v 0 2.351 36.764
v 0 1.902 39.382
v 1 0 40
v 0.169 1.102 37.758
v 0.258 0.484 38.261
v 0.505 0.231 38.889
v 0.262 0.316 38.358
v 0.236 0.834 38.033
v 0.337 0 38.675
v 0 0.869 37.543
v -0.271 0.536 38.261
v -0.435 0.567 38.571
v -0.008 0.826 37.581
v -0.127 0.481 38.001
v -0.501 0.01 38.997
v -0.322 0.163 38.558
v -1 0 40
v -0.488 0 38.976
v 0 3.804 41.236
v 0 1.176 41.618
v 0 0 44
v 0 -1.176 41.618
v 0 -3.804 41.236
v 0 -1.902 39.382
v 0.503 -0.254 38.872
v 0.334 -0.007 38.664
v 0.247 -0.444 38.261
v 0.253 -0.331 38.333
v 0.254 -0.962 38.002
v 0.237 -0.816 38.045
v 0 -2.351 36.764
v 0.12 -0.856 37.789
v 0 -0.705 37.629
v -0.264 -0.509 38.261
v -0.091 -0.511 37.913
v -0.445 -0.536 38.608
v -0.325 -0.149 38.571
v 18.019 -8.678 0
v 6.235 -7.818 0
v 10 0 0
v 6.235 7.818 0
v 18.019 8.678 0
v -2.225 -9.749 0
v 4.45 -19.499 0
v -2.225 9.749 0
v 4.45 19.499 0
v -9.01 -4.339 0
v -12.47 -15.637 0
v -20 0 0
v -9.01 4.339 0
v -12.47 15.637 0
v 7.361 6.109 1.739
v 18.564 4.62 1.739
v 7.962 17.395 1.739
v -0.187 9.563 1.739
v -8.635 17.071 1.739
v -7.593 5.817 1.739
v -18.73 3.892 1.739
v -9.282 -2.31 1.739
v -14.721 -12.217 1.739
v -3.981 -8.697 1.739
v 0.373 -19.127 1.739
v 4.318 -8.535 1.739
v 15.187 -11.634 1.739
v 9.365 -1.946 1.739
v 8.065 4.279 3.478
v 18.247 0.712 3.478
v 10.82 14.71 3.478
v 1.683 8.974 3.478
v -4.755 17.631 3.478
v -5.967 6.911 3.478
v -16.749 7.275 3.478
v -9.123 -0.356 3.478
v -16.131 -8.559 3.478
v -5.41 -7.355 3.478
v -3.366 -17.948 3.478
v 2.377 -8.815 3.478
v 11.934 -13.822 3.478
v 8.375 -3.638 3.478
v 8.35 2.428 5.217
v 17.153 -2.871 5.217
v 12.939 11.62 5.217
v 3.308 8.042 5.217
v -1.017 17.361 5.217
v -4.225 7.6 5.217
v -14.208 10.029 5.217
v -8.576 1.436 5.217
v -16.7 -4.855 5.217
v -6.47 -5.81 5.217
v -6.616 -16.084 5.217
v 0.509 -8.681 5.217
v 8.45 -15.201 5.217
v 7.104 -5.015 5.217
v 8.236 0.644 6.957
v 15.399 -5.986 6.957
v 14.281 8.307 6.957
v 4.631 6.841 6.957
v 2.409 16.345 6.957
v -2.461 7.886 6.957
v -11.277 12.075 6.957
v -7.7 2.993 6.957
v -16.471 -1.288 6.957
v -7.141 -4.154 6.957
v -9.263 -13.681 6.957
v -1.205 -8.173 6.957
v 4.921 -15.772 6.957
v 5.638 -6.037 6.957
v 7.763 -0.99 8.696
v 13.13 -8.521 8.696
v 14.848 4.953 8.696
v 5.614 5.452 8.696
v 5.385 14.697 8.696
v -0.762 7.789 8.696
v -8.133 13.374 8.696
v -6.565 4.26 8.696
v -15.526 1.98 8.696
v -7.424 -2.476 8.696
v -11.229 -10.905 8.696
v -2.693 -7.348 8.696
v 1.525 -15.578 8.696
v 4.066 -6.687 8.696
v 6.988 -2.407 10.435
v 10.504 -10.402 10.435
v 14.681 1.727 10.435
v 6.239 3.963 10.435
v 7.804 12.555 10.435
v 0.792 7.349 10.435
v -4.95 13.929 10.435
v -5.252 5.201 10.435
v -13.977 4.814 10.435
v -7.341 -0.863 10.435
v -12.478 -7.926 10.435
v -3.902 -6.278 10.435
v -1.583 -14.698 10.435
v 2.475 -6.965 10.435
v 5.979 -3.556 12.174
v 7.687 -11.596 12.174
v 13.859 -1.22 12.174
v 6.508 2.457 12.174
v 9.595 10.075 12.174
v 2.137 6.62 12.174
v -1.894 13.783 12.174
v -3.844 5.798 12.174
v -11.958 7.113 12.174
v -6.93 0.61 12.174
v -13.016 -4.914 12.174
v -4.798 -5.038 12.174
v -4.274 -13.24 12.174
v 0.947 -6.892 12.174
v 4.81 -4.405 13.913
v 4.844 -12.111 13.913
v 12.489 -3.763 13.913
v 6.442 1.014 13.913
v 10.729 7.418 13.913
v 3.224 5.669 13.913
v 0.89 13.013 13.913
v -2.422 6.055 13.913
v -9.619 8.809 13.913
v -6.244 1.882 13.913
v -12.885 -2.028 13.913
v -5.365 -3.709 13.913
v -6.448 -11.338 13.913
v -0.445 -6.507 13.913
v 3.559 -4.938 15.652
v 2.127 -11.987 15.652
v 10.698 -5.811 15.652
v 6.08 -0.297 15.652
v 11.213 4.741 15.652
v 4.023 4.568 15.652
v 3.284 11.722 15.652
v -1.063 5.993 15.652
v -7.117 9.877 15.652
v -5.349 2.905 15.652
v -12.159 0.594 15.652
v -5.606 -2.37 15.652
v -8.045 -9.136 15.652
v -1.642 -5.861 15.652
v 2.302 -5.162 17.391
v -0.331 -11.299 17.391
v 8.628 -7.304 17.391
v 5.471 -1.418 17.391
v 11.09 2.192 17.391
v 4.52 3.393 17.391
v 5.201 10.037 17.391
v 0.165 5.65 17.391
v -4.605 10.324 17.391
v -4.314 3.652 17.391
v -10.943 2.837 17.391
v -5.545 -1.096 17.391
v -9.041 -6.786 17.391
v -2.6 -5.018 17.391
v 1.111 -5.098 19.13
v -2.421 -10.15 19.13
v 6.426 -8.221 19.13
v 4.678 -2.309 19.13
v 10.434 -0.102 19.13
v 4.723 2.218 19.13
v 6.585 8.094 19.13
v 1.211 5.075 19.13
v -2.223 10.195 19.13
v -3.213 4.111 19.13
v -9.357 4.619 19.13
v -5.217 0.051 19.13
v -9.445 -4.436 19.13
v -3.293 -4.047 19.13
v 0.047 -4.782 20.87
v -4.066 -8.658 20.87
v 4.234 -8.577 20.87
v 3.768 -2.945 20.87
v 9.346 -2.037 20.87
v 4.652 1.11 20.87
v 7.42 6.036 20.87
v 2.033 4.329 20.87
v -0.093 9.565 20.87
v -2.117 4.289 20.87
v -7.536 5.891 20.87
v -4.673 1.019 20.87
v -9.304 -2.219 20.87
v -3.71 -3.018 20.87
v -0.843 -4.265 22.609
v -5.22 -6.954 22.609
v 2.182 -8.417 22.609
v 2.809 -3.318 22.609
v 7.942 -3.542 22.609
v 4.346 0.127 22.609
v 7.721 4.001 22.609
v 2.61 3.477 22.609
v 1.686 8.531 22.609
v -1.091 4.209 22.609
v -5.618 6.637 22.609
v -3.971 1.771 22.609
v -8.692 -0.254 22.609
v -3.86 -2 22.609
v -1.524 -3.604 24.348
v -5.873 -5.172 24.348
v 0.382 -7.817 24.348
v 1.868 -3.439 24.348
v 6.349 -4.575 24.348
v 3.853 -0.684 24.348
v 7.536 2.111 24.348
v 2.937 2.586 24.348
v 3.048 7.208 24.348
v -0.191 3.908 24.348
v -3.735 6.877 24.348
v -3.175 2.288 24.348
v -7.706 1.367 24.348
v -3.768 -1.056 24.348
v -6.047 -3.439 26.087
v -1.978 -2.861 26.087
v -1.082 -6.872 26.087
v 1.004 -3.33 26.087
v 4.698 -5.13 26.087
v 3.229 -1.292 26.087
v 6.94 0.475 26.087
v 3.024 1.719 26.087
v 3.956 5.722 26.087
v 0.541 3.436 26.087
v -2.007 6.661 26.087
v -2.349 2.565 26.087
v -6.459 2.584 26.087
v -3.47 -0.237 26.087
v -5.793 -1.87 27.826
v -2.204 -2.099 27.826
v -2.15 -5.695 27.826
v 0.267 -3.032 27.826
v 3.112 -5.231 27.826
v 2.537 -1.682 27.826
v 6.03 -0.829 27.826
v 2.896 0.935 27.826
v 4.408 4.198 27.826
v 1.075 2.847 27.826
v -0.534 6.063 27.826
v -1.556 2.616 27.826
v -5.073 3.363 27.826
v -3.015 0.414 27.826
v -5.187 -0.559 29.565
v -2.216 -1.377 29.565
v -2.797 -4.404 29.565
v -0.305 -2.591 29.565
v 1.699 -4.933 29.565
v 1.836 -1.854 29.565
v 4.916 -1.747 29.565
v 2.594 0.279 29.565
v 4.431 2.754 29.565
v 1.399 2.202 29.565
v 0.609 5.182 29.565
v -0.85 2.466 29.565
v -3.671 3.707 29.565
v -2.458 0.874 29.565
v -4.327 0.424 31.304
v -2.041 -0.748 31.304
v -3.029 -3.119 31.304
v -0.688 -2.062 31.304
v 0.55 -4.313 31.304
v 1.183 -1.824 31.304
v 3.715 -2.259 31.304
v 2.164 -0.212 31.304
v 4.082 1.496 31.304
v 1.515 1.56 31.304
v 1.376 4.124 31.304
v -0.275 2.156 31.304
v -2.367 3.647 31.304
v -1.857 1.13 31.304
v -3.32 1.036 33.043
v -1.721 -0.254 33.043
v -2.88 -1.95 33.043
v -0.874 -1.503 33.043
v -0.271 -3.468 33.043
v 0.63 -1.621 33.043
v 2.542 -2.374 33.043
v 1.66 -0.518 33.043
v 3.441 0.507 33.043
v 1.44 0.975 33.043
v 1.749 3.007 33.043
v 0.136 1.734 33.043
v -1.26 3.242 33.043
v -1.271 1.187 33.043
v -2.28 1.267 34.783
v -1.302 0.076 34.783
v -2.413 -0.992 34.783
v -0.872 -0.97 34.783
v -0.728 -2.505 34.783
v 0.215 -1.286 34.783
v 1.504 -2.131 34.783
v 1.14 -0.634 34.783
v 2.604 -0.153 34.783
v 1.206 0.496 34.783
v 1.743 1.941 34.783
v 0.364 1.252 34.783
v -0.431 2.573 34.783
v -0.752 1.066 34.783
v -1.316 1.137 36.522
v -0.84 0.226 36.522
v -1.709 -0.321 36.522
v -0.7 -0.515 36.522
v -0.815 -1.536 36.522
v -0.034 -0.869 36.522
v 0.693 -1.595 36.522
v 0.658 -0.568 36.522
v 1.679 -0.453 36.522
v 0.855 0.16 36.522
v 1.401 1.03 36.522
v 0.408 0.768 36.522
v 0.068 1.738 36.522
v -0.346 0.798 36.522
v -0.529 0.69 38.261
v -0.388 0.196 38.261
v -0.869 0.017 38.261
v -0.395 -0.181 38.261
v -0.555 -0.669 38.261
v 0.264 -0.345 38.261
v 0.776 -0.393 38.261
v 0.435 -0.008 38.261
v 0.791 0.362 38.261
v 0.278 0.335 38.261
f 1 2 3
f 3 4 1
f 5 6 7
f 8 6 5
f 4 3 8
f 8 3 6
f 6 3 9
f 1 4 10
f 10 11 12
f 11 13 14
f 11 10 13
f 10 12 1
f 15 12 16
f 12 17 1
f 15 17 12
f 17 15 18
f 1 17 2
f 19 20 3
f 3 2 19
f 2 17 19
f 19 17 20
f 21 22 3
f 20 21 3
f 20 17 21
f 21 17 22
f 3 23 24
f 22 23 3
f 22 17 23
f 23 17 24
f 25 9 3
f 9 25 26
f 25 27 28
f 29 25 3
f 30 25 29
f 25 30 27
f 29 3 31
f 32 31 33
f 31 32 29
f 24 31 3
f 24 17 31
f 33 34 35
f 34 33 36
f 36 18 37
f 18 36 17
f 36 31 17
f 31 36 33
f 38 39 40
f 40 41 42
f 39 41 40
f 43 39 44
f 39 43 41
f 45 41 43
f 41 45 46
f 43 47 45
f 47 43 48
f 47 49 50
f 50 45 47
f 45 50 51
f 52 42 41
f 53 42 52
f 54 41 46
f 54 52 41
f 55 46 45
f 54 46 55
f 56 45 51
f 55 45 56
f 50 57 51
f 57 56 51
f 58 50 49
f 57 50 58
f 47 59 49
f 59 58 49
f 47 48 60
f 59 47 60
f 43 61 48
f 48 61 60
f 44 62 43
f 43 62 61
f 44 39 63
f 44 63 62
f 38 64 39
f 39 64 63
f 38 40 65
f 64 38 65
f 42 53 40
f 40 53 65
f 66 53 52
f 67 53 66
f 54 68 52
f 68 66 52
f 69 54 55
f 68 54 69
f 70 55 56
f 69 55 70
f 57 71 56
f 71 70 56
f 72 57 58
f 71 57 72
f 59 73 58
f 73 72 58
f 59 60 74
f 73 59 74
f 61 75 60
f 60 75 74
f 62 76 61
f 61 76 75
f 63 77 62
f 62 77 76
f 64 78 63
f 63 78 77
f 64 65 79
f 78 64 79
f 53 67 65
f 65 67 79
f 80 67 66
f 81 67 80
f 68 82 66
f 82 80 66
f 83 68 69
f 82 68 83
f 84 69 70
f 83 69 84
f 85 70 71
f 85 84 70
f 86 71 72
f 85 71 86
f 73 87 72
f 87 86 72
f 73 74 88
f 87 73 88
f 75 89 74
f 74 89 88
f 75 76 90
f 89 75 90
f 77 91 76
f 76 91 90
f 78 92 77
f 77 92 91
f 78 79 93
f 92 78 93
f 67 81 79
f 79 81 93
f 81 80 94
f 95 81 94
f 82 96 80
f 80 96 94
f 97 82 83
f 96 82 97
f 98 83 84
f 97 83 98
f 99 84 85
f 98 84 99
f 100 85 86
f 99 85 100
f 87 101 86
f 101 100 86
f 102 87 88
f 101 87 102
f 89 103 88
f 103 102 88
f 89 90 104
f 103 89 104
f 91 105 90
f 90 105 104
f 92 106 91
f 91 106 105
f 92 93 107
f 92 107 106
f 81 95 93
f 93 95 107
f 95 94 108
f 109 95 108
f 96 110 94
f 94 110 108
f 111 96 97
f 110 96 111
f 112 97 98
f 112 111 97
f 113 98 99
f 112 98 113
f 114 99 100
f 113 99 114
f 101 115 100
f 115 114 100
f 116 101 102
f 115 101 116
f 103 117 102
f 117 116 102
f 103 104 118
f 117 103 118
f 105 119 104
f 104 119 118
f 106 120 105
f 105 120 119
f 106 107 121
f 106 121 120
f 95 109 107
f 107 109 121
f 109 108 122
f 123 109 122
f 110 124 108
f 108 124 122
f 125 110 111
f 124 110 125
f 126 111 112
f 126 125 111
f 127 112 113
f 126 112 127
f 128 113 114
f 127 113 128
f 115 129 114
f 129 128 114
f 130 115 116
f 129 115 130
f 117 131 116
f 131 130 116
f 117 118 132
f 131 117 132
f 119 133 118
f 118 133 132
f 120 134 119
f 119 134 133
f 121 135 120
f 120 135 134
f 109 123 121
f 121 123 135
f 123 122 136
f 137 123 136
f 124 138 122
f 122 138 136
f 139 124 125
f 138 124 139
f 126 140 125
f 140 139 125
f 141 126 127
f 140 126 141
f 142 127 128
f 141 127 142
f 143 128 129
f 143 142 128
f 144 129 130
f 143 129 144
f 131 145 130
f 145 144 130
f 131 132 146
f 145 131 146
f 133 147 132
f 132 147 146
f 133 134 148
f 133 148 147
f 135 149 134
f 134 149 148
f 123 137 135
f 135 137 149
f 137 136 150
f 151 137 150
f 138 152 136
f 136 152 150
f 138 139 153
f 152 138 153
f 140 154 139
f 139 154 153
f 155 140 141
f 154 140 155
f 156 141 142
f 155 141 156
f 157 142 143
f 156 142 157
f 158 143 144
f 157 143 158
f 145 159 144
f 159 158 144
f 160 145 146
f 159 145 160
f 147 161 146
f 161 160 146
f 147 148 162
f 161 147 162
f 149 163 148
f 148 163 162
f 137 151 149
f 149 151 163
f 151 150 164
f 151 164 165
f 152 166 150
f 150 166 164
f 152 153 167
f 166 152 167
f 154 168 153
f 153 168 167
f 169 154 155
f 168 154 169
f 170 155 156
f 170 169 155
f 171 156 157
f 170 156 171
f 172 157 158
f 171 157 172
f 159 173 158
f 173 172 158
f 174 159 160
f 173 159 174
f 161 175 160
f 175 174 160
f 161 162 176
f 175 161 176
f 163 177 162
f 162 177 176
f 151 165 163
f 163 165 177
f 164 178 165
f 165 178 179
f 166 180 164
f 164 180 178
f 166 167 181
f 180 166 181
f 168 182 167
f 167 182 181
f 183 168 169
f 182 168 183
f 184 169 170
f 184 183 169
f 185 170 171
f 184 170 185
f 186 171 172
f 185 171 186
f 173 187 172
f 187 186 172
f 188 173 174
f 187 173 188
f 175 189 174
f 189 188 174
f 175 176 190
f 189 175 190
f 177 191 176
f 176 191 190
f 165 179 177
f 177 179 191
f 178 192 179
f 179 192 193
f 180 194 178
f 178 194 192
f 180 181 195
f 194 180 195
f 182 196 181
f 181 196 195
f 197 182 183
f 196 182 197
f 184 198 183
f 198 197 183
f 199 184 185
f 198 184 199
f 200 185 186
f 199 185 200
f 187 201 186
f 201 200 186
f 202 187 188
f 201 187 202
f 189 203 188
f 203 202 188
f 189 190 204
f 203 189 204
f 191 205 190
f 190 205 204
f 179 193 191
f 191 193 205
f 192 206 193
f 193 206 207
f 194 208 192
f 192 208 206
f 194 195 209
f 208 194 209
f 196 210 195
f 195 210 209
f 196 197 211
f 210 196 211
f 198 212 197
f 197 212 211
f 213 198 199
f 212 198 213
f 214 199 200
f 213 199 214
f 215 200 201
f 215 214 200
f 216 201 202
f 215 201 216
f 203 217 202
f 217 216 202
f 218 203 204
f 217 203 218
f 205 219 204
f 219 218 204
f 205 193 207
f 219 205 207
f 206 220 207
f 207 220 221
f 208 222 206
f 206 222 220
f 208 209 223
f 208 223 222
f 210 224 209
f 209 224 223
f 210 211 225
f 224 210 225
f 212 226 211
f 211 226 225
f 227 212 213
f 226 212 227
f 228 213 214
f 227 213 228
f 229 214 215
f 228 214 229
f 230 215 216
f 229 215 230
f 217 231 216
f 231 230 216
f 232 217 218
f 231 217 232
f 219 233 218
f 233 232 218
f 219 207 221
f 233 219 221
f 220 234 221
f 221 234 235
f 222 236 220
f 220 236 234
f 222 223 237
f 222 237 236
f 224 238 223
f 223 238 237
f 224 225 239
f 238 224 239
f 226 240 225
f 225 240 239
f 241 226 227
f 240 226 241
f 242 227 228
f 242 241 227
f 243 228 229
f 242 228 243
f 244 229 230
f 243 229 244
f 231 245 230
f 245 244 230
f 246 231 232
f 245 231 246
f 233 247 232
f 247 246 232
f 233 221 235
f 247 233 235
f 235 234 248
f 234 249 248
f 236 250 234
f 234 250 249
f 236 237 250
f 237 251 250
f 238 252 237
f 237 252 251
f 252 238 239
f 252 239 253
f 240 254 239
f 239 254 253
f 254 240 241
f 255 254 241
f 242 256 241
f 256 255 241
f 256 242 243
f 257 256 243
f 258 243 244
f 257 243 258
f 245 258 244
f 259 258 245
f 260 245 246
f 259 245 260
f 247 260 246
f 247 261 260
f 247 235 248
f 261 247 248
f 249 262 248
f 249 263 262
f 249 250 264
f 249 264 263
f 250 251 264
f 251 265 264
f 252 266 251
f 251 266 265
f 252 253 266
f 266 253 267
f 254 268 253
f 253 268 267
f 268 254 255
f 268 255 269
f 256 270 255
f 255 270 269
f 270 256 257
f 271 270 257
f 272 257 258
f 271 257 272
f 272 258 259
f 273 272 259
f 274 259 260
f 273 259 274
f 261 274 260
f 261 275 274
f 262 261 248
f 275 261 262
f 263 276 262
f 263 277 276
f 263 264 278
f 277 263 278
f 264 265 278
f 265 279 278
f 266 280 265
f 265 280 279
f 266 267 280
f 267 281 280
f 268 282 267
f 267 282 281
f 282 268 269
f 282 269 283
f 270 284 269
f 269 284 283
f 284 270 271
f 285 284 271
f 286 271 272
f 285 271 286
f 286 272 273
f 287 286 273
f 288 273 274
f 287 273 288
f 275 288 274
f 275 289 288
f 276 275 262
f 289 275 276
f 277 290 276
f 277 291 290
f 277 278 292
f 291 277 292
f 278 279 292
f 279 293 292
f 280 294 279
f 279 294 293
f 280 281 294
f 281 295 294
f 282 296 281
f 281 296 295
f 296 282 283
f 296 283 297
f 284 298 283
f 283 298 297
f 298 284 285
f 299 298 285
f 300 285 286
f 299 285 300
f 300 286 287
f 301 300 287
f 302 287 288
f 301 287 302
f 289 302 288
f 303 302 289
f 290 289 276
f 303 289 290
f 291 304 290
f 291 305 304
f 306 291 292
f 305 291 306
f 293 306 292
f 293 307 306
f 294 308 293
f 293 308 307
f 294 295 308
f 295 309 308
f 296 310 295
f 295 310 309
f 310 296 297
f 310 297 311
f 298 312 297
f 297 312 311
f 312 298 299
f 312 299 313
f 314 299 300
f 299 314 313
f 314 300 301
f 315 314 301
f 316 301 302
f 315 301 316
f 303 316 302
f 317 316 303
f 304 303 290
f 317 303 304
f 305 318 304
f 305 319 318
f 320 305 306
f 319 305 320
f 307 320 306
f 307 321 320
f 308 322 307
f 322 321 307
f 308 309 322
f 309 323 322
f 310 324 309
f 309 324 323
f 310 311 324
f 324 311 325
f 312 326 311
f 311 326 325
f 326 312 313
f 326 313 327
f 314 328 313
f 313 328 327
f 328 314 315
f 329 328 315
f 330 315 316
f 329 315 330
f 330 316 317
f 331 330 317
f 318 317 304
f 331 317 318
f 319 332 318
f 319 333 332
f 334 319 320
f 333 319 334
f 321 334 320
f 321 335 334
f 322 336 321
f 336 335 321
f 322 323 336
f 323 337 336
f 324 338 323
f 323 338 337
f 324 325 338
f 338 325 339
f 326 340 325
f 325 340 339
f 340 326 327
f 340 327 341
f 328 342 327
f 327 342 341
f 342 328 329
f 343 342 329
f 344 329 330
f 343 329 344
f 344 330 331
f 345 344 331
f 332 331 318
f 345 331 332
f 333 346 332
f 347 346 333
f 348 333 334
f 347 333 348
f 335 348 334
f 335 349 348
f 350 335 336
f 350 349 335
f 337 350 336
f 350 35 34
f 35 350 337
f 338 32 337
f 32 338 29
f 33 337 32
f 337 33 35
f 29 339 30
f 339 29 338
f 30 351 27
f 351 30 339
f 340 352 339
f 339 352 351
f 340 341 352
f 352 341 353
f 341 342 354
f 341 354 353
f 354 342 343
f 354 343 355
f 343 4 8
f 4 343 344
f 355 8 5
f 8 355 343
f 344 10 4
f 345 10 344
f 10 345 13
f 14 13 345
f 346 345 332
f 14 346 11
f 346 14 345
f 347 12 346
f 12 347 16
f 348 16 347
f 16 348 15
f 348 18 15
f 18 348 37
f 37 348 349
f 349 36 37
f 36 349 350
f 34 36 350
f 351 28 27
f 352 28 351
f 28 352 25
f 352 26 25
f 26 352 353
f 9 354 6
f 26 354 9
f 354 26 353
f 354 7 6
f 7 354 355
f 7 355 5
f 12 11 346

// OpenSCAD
// points = number of points (minimum 3)
// outer  = radius to outer points
// inner  = radius to inner points
module Star(points=5, outer=20, inner=10, height=5, 3d=false) {
	
	// polar to cartesian: radius/angle to x/y
	function x(r, a) = r * cos(a);
	function y(r, a) = r * sin(a);
	
	// angular width of each pie slice of the star
	increment = 360/points;
	
	// outer is outer point p
	// inner is inner point following p
	// next is next outer point following p
    module point() {
        if (3d==false) {
            assign(	x_outer = x(outer, 0),
                y_outer = y(outer, 0),
                x_inner = x(inner, increment/2),
                y_inner = y(inner, increment/2),
                x_next  = x(outer, increment),
                y_next  = y(outer, increment)) {
                    polygon(points = [[x_outer, y_outer], [x_inner, y_inner], [x_next, y_next], [0, 0]], paths  = [[0, 1, 2, 3]]);};
        } else {
            assign(	x_outer = x(outer, 0),
                y_outer = y(outer, 0),
                x_inner = x(inner, increment/2),
                y_inner = y(inner, increment/2),
                x_next  = x(outer, increment),
                y_next  = y(outer, increment)) {
                    linear_extrude(height=height, scale=0)
                        polygon(points = [[x_outer, y_outer], [x_inner, y_inner], [x_next, y_next], [0, 0]], paths  = [[0, 1, 2, 3]]);
                    mirror([0,0,1])
                        linear_extrude(height=height, scale=0)
                            polygon(points = [[x_outer, y_outer], [x_inner, y_inner], [x_next, y_next], [0, 0]], paths  = [[0, 1, 2, 3]]);
            };
        };
    };
	
    for (p=[0:points-1]) {
        rotate(increment*p)
            point();
    };
};

color("green")
    linear_extrude(height=40, scale=0, twist=270)
        Star(7,10,20);

color("gold")
    translate([0,0,40])
        rotate([0,90,0])
            Star(5,2,4,1, 3d=true);
